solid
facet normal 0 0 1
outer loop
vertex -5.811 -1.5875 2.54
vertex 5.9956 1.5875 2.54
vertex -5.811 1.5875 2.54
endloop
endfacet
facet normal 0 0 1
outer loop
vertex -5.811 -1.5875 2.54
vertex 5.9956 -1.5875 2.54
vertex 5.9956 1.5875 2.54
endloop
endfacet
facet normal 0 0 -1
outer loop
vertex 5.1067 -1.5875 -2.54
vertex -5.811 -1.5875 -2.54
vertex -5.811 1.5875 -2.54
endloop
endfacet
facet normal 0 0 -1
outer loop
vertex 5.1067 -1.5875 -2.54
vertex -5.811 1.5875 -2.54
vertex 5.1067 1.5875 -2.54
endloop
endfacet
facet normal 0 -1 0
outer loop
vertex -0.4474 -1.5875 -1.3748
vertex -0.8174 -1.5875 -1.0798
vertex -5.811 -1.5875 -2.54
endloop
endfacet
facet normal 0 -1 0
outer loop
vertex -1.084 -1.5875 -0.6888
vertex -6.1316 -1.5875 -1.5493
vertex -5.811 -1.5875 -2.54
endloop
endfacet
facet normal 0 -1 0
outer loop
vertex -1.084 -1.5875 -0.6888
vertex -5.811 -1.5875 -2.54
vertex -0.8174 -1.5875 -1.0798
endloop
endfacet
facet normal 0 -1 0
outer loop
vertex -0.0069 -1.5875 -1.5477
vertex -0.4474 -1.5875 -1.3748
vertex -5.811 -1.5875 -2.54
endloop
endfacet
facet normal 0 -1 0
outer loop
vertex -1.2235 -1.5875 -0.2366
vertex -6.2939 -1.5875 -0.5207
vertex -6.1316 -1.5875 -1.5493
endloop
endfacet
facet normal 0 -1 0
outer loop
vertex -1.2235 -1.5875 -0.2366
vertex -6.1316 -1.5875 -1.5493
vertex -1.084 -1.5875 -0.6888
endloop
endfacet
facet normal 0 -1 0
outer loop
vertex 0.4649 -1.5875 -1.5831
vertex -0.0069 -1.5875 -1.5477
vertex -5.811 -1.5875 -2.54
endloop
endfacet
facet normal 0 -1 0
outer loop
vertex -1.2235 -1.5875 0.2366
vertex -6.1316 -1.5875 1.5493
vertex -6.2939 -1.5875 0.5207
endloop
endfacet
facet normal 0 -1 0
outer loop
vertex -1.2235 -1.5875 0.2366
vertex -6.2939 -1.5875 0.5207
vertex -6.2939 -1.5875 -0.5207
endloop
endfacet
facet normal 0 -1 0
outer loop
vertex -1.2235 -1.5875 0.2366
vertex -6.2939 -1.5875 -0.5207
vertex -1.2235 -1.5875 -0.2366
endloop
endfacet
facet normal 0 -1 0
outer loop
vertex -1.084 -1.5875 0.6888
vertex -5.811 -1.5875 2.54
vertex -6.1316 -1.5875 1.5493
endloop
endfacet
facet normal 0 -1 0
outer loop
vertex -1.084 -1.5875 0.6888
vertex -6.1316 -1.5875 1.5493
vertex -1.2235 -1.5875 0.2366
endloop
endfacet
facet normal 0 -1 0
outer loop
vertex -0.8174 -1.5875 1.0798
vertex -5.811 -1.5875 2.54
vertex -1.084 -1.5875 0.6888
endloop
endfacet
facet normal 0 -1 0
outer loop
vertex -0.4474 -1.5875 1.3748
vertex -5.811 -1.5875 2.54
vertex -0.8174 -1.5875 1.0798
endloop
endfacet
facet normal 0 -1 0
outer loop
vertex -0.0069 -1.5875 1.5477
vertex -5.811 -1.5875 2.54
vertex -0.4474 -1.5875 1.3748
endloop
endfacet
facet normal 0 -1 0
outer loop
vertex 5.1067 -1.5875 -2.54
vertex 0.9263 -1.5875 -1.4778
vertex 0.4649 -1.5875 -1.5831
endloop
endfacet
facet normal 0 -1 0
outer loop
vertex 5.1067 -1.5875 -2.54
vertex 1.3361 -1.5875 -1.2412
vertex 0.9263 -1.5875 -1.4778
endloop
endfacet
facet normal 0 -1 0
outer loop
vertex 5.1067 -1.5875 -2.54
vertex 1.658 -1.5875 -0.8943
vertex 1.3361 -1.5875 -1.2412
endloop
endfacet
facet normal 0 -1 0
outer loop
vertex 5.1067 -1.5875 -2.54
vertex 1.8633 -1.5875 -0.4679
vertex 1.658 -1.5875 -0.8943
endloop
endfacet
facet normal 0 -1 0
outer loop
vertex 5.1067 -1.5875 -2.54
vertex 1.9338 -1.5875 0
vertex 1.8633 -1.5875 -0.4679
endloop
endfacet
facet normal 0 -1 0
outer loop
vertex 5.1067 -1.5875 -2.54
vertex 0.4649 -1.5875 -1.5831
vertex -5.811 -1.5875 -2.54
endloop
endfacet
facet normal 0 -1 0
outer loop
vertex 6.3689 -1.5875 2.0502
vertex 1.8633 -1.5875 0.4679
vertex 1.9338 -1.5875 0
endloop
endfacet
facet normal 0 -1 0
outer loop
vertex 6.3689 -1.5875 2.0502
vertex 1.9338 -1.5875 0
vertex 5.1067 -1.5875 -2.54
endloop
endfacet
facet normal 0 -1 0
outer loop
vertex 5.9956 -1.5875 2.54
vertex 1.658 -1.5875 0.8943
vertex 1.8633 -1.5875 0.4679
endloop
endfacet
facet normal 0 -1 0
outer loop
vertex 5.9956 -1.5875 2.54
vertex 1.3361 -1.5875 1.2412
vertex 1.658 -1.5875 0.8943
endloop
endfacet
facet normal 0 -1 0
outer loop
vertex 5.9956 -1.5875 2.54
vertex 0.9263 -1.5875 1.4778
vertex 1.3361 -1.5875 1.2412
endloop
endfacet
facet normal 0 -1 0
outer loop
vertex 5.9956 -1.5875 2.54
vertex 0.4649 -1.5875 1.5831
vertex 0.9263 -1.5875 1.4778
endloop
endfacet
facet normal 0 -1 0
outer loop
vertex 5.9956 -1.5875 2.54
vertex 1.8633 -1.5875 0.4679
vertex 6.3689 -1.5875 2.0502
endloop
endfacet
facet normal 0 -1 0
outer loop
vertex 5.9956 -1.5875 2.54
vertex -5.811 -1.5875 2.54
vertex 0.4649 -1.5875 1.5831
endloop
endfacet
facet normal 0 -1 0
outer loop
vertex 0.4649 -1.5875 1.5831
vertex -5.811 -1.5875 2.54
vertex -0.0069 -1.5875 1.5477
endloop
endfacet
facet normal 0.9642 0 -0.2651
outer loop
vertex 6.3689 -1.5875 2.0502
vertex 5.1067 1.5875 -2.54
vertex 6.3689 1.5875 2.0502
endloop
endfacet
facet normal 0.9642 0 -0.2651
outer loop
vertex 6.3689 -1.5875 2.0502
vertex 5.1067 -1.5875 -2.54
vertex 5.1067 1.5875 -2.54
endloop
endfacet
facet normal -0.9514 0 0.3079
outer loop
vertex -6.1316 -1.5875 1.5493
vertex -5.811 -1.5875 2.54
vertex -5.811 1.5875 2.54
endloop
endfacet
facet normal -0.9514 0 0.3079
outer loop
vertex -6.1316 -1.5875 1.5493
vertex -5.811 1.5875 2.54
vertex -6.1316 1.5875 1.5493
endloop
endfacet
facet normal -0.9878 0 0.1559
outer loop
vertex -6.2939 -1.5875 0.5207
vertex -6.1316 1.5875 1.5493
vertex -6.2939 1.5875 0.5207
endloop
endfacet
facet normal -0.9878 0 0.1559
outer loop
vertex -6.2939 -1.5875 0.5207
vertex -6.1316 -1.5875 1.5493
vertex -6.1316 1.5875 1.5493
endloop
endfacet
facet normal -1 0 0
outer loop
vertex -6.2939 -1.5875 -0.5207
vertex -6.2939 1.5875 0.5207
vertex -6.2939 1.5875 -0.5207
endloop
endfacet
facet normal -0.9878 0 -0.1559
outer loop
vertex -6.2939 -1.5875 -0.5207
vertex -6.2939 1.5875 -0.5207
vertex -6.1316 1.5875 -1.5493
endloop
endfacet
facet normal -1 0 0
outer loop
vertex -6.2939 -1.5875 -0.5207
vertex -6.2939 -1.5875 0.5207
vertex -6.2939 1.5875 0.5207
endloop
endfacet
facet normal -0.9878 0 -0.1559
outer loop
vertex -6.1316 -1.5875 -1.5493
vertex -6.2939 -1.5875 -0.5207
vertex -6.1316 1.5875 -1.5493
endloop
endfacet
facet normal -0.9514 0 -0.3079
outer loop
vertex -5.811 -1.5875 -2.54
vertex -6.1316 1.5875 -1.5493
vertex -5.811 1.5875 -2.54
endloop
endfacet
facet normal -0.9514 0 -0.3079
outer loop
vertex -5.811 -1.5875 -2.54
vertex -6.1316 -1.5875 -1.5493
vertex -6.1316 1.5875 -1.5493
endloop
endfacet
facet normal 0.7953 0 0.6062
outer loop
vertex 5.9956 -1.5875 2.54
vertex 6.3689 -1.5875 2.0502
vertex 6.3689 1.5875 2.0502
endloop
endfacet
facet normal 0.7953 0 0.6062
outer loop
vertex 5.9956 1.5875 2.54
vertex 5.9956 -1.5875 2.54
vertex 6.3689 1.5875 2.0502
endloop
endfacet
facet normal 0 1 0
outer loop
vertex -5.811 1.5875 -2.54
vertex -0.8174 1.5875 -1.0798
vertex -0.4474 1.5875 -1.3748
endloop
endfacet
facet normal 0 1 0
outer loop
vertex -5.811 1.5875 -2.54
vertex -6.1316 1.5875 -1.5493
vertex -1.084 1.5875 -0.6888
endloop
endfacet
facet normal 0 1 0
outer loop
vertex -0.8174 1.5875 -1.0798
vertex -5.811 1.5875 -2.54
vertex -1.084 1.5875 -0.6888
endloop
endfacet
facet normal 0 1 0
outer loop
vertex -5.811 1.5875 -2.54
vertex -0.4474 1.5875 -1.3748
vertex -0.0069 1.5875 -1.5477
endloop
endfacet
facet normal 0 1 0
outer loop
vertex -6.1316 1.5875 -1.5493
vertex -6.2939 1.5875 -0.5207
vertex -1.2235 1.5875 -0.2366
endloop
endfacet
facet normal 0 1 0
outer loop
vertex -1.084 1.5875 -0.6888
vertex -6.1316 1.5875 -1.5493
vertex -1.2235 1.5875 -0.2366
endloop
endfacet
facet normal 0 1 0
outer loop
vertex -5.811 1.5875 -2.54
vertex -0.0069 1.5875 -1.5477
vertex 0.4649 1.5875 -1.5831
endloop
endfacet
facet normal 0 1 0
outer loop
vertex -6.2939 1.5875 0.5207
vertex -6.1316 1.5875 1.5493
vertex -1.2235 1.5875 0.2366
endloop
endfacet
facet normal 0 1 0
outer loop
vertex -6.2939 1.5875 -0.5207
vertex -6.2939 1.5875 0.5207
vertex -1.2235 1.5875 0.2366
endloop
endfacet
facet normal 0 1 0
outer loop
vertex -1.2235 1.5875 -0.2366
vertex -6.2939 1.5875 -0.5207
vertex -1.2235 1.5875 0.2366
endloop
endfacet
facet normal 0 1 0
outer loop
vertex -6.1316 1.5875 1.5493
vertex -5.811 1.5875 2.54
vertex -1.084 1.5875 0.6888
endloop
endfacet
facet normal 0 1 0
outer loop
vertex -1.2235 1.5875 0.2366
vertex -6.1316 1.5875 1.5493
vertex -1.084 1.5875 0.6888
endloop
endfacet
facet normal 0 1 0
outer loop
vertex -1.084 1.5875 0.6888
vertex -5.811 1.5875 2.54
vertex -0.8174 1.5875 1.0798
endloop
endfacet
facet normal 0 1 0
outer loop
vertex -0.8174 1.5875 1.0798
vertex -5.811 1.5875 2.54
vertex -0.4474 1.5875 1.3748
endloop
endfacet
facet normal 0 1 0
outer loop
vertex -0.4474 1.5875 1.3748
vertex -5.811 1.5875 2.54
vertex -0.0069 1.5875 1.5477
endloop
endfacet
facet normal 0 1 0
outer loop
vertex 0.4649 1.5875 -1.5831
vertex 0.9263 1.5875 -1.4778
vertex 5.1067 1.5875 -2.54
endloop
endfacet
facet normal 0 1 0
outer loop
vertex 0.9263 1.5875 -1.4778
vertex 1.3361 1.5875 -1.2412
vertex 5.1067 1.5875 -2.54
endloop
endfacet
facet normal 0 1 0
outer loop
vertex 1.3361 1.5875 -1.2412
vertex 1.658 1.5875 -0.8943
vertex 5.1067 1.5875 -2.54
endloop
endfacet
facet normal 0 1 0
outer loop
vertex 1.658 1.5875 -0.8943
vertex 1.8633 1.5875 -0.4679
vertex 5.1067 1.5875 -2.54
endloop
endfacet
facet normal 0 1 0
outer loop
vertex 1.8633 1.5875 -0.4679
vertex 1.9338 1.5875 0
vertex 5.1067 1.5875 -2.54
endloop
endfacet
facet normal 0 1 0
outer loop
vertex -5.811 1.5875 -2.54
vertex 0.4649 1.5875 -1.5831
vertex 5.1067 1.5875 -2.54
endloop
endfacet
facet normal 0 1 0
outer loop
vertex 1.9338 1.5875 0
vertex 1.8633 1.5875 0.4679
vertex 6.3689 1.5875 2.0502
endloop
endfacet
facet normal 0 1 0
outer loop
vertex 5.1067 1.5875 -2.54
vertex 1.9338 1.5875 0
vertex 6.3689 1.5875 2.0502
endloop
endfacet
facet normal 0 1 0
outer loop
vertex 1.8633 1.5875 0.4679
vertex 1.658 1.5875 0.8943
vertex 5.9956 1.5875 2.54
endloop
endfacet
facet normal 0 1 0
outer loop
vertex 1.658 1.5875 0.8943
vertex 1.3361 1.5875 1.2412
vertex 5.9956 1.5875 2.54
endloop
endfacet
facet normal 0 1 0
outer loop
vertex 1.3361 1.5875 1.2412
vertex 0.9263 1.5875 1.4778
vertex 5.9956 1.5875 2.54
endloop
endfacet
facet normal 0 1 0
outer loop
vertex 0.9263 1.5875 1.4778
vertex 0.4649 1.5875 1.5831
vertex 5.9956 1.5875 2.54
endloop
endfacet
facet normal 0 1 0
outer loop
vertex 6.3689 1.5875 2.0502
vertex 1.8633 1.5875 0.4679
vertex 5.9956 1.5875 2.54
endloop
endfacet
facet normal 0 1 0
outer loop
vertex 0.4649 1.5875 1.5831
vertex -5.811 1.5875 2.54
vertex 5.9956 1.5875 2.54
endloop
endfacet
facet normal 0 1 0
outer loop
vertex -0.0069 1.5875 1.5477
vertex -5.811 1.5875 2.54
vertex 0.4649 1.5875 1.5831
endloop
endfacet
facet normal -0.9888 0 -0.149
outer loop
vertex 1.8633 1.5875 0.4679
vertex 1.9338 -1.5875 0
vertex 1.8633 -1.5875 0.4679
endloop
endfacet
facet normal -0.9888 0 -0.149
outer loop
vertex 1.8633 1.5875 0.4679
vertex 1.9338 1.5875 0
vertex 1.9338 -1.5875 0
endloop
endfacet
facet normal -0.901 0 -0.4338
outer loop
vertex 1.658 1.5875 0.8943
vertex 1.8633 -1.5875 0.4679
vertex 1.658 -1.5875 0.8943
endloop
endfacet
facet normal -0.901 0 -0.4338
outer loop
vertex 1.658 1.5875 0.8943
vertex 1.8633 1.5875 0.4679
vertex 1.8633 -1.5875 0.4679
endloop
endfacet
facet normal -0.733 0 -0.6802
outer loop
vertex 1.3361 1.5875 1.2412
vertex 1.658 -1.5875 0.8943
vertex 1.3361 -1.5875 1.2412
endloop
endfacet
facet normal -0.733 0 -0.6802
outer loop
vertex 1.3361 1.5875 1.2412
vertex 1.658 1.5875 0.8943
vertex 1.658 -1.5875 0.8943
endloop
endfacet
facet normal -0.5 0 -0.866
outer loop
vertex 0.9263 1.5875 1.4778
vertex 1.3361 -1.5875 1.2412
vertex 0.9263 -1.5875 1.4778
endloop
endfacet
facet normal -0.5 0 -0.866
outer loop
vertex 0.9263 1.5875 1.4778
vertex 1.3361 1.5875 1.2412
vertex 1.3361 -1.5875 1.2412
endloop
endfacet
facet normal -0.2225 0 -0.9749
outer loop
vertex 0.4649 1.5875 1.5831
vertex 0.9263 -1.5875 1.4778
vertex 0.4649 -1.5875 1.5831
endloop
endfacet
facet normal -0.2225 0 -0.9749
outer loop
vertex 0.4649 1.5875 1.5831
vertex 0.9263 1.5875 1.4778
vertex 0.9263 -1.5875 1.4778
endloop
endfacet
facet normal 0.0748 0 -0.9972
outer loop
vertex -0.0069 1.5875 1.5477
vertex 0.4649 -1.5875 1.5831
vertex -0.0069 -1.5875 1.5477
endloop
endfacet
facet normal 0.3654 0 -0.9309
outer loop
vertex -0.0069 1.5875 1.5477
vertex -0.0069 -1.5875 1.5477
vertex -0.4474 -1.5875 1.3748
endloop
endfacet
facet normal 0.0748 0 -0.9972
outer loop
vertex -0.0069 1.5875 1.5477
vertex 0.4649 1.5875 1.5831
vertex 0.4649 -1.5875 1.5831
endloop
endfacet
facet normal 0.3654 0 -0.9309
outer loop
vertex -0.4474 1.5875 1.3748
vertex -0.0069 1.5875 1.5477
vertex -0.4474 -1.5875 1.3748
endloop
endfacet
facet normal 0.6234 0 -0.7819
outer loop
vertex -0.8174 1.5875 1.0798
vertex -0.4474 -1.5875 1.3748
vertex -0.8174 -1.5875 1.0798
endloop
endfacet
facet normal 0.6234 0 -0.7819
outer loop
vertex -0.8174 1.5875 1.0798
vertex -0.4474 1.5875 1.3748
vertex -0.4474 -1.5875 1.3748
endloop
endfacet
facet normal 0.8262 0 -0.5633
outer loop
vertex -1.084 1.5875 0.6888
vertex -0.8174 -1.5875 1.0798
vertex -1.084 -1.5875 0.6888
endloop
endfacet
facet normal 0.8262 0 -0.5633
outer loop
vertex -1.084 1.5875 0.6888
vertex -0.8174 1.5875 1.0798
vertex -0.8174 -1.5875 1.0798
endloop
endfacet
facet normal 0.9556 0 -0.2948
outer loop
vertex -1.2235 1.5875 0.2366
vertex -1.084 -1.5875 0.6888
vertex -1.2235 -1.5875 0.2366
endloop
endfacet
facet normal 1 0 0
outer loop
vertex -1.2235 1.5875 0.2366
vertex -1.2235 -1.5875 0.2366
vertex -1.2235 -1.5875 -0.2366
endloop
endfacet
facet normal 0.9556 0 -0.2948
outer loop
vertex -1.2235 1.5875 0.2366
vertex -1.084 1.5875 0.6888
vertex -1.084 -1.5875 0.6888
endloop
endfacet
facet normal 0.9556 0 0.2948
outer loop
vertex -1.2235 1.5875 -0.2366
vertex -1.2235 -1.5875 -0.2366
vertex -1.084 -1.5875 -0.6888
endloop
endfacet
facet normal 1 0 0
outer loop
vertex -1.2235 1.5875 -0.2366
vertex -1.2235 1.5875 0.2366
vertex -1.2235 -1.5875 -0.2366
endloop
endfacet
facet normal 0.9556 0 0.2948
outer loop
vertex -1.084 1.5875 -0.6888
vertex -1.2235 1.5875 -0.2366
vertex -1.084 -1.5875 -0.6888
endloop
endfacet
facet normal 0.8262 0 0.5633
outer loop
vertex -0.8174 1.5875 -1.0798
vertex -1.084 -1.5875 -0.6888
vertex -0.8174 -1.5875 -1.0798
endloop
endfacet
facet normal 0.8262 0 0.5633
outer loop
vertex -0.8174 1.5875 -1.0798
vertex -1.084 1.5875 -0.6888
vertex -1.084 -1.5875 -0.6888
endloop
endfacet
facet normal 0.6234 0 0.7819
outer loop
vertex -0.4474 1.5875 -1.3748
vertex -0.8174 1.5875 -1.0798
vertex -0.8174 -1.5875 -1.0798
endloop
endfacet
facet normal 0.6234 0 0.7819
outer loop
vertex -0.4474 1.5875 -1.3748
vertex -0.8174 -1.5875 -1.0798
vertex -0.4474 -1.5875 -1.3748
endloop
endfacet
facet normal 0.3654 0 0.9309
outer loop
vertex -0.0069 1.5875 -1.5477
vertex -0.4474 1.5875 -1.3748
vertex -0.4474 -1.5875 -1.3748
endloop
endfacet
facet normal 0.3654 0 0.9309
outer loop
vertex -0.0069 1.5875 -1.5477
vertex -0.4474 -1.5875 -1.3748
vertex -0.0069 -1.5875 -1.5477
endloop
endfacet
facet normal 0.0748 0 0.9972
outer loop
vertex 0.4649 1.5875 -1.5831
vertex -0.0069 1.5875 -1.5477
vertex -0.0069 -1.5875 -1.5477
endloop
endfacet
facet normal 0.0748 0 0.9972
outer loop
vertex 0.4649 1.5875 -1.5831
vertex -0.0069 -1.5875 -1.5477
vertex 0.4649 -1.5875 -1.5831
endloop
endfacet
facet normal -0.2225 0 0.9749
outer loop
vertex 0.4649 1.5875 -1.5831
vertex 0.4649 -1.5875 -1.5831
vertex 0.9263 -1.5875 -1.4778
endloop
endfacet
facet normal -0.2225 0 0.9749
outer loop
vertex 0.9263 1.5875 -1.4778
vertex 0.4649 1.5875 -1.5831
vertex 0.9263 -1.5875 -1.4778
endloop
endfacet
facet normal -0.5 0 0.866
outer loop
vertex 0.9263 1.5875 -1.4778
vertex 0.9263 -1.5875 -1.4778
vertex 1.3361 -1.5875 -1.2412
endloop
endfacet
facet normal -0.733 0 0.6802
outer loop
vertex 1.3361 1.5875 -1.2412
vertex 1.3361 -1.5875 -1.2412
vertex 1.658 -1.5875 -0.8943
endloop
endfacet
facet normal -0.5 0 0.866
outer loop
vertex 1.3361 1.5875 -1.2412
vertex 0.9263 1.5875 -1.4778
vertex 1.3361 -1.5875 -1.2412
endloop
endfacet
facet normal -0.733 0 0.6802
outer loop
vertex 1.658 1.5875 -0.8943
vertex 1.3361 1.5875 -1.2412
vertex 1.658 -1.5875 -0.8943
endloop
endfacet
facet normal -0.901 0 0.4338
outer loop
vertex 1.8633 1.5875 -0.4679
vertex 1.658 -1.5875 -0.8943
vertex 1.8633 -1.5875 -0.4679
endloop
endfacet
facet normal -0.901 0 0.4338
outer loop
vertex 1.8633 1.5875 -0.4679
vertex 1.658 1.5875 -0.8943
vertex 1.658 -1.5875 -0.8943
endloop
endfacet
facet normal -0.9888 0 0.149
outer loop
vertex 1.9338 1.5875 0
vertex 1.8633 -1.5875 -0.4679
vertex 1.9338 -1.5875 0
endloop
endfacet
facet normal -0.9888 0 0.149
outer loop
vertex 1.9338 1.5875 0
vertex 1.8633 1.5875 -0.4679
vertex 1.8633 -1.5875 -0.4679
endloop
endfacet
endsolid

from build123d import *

# Parameters (mm, degrees)
F0_R     = 1.5875
F1_DEPTH = 1.5875
F2_SIZE  = 0.508


with BuildPart() as f1:
    # F0 (on Front) → F1 (new body, symmetric)
    with BuildSketch(Plane.XZ):
        with BuildLine():
            Line((6.503597, 2.54), (-5.810977, 2.54))
            ThreePointArc((-5.810977, 2.54), (-6.314305, 0), (-5.810977, -2.54))
            Line((-5.810977, -2.54), (5.106739, -2.54))
            Line((5.106739, -2.54), (6.503597, 2.54))
        make_face()
        with Locations((0.34631, 0)):
            Circle(F0_R, mode=Mode.SUBTRACT)
    extrude(amount=F1_DEPTH, both=True)

    # F2
    f2_edges = [f1.edges().sort_by_distance(p)[0] for p in [
        (6.503597, 0, 2.54),
    ]]
    chamfer(f2_edges, length=F2_SIZE)


solid = f1.part
